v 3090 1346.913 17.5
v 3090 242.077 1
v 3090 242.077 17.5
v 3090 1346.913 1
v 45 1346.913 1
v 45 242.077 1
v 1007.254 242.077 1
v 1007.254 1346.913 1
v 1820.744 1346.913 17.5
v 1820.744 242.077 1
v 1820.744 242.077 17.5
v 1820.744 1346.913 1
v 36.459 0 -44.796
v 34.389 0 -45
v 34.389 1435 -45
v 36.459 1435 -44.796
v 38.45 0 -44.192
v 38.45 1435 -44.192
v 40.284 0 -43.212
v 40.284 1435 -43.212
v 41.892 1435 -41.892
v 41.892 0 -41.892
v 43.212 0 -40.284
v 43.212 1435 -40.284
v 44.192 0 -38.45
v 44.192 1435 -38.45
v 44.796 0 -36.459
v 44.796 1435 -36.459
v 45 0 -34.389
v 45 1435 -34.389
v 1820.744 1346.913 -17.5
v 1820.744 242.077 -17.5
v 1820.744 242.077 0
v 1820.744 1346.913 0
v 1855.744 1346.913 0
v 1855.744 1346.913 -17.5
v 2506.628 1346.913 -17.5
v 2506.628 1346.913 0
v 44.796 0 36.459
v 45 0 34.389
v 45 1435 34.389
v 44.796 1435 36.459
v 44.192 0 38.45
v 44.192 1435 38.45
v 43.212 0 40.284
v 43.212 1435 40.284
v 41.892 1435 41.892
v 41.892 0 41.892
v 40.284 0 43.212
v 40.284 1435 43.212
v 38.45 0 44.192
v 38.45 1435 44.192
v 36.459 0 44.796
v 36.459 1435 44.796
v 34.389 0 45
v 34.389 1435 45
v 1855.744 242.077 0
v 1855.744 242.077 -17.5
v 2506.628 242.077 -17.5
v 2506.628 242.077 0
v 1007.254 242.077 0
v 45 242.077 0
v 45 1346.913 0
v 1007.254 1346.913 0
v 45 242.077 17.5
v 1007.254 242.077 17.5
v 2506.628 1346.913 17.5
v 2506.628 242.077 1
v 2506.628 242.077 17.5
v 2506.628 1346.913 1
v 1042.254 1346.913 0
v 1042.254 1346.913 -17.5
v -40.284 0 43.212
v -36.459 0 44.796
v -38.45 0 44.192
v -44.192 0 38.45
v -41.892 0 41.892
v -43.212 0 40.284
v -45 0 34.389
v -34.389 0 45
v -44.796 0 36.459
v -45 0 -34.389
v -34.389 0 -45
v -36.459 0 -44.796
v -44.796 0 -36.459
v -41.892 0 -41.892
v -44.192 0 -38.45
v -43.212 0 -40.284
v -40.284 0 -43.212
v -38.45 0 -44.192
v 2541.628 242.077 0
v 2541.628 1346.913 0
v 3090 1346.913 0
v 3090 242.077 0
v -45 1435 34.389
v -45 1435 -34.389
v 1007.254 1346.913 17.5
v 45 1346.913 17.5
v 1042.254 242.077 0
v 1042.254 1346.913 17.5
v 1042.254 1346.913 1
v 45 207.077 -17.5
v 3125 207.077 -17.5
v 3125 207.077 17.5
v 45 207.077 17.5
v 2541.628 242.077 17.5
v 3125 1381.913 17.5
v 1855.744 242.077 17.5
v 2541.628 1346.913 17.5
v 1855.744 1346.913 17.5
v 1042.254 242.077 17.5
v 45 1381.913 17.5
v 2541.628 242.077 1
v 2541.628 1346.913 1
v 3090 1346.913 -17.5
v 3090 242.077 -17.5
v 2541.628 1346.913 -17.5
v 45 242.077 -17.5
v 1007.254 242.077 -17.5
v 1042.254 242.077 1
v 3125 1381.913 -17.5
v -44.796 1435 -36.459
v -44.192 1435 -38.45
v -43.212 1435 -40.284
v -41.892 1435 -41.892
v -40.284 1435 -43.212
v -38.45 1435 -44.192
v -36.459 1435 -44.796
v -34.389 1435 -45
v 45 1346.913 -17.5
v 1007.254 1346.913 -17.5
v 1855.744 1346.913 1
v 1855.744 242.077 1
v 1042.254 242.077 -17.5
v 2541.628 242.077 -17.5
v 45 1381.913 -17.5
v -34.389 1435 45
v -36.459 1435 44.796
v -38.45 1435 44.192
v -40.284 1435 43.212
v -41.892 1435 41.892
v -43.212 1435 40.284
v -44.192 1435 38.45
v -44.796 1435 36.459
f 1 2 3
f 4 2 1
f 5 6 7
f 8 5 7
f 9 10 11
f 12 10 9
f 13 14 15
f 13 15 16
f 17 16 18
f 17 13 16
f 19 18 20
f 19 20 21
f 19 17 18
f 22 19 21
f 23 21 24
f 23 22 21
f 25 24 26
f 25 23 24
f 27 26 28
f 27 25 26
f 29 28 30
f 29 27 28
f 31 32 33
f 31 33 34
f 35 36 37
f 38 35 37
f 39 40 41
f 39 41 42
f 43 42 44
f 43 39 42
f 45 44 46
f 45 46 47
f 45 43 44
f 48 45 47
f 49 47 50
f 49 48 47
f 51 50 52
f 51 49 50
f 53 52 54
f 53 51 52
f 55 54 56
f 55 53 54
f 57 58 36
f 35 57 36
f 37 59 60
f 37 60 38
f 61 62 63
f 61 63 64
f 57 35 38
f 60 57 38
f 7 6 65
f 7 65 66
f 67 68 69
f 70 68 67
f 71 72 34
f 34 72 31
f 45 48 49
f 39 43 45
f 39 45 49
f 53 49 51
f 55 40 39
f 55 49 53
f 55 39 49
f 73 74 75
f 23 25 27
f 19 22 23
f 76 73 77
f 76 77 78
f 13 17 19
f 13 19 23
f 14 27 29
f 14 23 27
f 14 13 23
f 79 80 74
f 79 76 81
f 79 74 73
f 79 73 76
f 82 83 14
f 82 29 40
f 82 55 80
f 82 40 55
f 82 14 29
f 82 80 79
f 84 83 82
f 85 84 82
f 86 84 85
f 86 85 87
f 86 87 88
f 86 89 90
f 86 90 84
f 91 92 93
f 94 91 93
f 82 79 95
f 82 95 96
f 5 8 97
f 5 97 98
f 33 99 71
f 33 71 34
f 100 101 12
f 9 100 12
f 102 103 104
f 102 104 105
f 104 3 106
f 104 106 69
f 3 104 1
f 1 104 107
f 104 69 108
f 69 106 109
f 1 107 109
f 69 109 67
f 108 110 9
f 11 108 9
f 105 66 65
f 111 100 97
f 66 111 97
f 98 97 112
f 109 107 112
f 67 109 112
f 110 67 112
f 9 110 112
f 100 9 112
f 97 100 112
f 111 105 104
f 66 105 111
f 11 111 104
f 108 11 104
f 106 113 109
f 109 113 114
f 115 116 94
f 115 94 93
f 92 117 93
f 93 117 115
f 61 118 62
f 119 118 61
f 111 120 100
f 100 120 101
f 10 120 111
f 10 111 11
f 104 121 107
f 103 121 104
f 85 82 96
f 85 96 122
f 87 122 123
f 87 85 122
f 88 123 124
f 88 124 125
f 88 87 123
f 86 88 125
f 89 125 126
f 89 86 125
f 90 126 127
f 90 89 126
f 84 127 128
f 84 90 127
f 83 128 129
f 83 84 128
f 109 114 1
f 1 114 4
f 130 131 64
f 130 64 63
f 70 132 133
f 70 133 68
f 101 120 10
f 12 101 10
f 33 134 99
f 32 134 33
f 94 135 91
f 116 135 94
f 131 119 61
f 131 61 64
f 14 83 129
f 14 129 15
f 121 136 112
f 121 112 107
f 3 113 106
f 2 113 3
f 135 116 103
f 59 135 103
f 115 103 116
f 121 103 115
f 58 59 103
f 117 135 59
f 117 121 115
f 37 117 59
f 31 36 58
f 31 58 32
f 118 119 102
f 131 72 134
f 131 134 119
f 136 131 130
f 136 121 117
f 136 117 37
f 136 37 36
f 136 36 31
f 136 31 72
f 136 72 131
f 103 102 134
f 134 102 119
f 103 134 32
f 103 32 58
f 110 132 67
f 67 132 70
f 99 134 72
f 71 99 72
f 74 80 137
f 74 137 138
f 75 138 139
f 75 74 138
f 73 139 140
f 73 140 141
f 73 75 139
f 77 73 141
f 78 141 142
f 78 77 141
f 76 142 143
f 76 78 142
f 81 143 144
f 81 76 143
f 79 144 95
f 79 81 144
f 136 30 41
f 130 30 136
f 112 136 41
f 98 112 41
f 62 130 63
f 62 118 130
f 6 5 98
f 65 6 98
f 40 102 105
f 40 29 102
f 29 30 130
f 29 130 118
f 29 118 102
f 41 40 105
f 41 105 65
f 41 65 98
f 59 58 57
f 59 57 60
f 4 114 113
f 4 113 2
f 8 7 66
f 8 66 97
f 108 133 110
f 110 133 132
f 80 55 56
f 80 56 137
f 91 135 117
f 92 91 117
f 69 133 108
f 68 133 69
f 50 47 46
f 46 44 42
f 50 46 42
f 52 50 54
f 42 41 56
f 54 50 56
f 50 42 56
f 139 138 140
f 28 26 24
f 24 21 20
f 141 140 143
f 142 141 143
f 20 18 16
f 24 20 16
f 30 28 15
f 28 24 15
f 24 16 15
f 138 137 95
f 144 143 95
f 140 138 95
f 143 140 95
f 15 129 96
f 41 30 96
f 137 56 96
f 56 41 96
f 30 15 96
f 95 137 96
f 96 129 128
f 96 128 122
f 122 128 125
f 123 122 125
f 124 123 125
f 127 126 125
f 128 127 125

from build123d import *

# Parameters (mm, degrees)
SALIENTE_EXTRUIR1_DEPTH      = 1435
SALIENTE_EXTRUIR2_DEPTH      = 17.5
SALIENTE_EXTRUIR2_DEPTH_BACK = 17.5
CROQUIS2_W                   = 548.37236968
CROQUIS2_H                   = 1104.83636681
CROQUIS2_W_2                 = 778.490117554
CROQUIS2_W_3                 = 650.883824605
CROQUIS3_W                   = 962.253688161
CROQUIS3_H                   = 1104.83636681
CROQUIS3_W_2                 = 778.490117554
CROQUIS3_W_3                 = 650.883824605
CROQUIS3_W_4                 = 548.37236968
SALIENTE_EXTRUIR3_DEPTH      = 1


with BuildPart() as part:
    # Croquis1 → Saliente-Extruir1 (new body)
    with BuildSketch(Plane(origin=(0, 0, 0), x_dir=(1, 0, 0), z_dir=(0, 1, 0))):
        with BuildLine():
            Line((-34.389023271, 45), (34.389023271, 45))
            ThreePointArc((34.389023271, 45), (41.892116871, 41.892116871), (45, 34.389023271))
            Line((45, 34.389023271), (45, -34.389023271))
            ThreePointArc((45, -34.389023271), (41.892116871, -41.892116871), (34.389023271, -45))
            Line((34.389023271, -45), (-34.389023271, -45))
            ThreePointArc((-34.389023271, -45), (-41.892116871, -41.892116871), (-45, -34.389023271))
            Line((-45, -34.389023271), (-45, 34.389023271))
            ThreePointArc((-45, 34.389023271), (-41.892116871, 41.892116871), (-34.389023271, 45))
        make_face()
    extrude(amount=SALIENTE_EXTRUIR1_DEPTH)

    # Croquis2 → Saliente-Extruir2 (add, two sides: drawn at the far end of the back side and taken through both)
    with BuildSketch(Plane.XY.offset(-SALIENTE_EXTRUIR2_DEPTH_BACK)):
        Polygon((45, 1381.912908734), (3125, 1381.912908734), (3125, 207.076541924), (45, 207.076541924), (45, 242.076541924), (1007.253688161, 242.076541924), (1007.253688161, 1346.912908734), (45, 1346.912908734), align=None)
        with Locations((2815.81381516, 794.494725329)):
            Rectangle(CROQUIS2_W, CROQUIS2_H, mode=Mode.SUBTRACT)
        with Locations((1431.498746938, 794.494725329)):
            Rectangle(CROQUIS2_W_2, CROQUIS2_H, mode=Mode.SUBTRACT)
        with Locations((2181.185718018, 794.494725329)):
            Rectangle(CROQUIS2_W_3, CROQUIS2_H, mode=Mode.SUBTRACT)
    extrude(amount=SALIENTE_EXTRUIR2_DEPTH + SALIENTE_EXTRUIR2_DEPTH_BACK)

    # Croquis3 → Saliente-Extruir3 (add)
    with BuildSketch(Plane.XY):
        with Locations((526.12684408, 794.494725329)):
            Rectangle(CROQUIS3_W, CROQUIS3_H)
        with Locations((1431.498746938, 794.494725329)):
            Rectangle(CROQUIS3_W_2, CROQUIS3_H)
        with Locations((2181.185718018, 794.494725329)):
            Rectangle(CROQUIS3_W_3, CROQUIS3_H)
        with Locations((2815.81381516, 794.494725329)):
            Rectangle(CROQUIS3_W_4, CROQUIS3_H)
    extrude(amount=SALIENTE_EXTRUIR3_DEPTH)


solid = part.part
